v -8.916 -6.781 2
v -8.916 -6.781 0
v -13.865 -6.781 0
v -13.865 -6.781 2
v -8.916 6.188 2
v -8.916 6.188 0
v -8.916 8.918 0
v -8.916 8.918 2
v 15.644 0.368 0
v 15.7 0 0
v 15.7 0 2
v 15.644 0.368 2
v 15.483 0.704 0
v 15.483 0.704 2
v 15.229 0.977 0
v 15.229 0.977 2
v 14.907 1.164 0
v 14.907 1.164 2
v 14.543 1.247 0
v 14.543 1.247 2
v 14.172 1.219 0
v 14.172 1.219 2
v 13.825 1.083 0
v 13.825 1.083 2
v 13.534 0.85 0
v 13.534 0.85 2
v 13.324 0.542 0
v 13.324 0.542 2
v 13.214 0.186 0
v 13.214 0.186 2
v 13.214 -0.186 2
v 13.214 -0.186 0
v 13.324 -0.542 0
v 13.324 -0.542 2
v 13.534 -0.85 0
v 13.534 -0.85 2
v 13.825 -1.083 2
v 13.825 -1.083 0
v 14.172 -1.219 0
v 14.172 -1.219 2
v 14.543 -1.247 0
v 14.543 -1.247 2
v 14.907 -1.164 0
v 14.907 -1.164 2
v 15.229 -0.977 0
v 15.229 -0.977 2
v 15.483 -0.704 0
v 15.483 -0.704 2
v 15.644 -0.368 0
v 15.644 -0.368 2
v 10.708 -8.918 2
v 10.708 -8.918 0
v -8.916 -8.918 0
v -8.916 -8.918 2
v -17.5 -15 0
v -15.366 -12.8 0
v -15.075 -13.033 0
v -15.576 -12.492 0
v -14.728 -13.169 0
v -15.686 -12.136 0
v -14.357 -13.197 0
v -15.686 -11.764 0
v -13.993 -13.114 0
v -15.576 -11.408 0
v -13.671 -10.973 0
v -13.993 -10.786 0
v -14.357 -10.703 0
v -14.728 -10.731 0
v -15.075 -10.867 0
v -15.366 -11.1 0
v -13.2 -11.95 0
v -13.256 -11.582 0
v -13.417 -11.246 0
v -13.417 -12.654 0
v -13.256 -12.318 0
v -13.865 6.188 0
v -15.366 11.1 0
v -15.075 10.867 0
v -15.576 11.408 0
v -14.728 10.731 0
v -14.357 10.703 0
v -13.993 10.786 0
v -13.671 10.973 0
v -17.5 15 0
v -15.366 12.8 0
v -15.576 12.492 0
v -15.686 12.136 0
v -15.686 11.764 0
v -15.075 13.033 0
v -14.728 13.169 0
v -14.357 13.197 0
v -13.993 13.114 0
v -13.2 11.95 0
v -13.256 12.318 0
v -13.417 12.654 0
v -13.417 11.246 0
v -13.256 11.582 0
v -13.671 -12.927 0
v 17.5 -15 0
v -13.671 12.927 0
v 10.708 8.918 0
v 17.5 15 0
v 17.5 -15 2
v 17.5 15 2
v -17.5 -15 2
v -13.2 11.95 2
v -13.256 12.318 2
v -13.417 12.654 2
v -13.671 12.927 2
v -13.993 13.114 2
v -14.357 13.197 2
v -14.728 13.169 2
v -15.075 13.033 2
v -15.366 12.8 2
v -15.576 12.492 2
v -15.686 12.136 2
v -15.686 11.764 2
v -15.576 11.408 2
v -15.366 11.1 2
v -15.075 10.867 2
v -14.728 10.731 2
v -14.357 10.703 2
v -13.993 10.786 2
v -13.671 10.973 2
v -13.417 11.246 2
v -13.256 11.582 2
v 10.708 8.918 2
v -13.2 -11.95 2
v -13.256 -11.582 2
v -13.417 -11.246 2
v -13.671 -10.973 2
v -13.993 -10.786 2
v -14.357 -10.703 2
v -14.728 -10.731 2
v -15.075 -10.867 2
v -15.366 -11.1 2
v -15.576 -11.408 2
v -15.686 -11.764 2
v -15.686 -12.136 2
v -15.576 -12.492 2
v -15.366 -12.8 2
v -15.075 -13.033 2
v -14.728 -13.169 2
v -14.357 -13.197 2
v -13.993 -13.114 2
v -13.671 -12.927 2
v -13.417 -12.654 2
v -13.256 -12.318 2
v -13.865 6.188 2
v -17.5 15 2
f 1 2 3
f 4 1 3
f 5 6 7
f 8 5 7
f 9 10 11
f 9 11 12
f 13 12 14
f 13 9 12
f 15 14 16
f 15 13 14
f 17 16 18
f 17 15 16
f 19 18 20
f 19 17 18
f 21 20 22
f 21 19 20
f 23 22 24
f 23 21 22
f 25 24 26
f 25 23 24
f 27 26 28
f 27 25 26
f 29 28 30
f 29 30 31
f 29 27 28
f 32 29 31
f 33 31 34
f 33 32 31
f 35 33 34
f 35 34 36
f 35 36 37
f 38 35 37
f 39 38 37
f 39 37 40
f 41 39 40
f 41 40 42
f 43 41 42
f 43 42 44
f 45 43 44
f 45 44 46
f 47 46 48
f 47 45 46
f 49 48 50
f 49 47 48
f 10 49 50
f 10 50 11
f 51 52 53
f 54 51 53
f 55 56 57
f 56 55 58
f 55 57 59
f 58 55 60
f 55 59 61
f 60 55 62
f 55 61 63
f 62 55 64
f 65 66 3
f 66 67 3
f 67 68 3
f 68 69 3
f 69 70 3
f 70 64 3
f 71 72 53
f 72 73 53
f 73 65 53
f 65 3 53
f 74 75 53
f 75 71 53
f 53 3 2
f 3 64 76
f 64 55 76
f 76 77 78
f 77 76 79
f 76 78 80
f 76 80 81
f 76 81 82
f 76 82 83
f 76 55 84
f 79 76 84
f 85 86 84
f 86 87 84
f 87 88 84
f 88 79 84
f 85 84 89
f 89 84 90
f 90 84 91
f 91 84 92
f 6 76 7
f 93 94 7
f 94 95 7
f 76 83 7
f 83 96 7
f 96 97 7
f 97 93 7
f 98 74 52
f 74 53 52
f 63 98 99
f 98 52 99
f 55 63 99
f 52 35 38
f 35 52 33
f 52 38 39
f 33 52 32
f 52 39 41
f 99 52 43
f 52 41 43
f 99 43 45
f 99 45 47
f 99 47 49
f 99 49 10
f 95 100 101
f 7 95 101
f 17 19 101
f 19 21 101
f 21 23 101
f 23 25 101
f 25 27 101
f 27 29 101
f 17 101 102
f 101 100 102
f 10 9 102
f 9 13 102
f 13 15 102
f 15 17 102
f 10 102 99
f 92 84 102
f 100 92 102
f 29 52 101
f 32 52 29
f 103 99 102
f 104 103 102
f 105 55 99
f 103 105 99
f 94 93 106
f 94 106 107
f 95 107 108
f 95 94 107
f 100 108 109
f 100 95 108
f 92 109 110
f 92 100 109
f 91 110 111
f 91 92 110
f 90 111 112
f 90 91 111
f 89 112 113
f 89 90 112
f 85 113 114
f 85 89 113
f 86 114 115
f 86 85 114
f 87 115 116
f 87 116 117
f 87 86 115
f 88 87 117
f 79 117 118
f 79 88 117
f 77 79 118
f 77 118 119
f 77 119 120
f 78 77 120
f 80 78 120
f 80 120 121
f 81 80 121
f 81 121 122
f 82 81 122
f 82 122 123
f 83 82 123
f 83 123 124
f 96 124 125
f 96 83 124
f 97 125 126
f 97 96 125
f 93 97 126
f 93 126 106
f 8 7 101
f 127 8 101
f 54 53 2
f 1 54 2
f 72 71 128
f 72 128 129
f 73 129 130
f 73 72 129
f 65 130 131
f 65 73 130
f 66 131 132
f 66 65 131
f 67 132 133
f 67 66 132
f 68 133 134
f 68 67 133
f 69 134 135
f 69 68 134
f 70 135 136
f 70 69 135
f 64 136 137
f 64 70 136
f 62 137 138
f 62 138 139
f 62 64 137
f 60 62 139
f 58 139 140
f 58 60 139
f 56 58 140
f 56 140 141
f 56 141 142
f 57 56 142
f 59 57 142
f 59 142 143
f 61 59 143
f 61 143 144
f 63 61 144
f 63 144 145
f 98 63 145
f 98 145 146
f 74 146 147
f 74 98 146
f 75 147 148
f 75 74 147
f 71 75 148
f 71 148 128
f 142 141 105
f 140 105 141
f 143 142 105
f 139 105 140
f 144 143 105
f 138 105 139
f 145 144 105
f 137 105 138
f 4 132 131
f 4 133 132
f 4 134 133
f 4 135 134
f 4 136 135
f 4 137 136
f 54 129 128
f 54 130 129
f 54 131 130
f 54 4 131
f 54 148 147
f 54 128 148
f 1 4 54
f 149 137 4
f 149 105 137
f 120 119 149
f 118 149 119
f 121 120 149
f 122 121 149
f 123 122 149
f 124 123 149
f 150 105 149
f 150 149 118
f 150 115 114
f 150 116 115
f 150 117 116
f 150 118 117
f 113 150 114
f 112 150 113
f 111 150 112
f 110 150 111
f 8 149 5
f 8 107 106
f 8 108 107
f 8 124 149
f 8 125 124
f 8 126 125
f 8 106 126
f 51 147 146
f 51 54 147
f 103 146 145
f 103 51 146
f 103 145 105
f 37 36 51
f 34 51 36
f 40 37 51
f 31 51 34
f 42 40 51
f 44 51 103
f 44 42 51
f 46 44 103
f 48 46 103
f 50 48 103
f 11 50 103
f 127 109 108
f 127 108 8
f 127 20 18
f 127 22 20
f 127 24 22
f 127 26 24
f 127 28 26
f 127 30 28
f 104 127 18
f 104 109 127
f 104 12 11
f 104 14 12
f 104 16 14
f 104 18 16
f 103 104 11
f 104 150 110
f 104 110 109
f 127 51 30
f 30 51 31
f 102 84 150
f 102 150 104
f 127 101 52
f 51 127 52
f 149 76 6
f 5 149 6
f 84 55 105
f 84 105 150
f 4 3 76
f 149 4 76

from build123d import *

# Parameters (mm, degrees)
F0_W     = 35
F0_H     = 30
F0_R     = 1.25
F1_DEPTH = 2


with BuildPart() as f1:
    # F0 (on Top) → F1 (new body)
    with BuildSketch(Plane.XY):
        Rectangle(F0_W, F0_H)
        with Locations((-14.45, -11.95)):
            Circle(F0_R, mode=Mode.SUBTRACT)
        Polygon((-8.916158, 8.917894), (8.916158, 8.917894), (10.707928, 8.917894), (10.707925, -8.917894), (8.916158, -8.917894), (-8.916158, -8.917894), (-8.916158, -6.781416), (-13.864904, -6.781416), (-13.864904, 6.187579), (-8.916158, 6.187579), align=None, mode=Mode.SUBTRACT)
        with Locations((-14.45, 11.95)):
            Circle(F0_R, mode=Mode.SUBTRACT)
        with Locations((14.45, 0)):
            Circle(F0_R, mode=Mode.SUBTRACT)
    extrude(amount=F1_DEPTH)


solid = f1.part
